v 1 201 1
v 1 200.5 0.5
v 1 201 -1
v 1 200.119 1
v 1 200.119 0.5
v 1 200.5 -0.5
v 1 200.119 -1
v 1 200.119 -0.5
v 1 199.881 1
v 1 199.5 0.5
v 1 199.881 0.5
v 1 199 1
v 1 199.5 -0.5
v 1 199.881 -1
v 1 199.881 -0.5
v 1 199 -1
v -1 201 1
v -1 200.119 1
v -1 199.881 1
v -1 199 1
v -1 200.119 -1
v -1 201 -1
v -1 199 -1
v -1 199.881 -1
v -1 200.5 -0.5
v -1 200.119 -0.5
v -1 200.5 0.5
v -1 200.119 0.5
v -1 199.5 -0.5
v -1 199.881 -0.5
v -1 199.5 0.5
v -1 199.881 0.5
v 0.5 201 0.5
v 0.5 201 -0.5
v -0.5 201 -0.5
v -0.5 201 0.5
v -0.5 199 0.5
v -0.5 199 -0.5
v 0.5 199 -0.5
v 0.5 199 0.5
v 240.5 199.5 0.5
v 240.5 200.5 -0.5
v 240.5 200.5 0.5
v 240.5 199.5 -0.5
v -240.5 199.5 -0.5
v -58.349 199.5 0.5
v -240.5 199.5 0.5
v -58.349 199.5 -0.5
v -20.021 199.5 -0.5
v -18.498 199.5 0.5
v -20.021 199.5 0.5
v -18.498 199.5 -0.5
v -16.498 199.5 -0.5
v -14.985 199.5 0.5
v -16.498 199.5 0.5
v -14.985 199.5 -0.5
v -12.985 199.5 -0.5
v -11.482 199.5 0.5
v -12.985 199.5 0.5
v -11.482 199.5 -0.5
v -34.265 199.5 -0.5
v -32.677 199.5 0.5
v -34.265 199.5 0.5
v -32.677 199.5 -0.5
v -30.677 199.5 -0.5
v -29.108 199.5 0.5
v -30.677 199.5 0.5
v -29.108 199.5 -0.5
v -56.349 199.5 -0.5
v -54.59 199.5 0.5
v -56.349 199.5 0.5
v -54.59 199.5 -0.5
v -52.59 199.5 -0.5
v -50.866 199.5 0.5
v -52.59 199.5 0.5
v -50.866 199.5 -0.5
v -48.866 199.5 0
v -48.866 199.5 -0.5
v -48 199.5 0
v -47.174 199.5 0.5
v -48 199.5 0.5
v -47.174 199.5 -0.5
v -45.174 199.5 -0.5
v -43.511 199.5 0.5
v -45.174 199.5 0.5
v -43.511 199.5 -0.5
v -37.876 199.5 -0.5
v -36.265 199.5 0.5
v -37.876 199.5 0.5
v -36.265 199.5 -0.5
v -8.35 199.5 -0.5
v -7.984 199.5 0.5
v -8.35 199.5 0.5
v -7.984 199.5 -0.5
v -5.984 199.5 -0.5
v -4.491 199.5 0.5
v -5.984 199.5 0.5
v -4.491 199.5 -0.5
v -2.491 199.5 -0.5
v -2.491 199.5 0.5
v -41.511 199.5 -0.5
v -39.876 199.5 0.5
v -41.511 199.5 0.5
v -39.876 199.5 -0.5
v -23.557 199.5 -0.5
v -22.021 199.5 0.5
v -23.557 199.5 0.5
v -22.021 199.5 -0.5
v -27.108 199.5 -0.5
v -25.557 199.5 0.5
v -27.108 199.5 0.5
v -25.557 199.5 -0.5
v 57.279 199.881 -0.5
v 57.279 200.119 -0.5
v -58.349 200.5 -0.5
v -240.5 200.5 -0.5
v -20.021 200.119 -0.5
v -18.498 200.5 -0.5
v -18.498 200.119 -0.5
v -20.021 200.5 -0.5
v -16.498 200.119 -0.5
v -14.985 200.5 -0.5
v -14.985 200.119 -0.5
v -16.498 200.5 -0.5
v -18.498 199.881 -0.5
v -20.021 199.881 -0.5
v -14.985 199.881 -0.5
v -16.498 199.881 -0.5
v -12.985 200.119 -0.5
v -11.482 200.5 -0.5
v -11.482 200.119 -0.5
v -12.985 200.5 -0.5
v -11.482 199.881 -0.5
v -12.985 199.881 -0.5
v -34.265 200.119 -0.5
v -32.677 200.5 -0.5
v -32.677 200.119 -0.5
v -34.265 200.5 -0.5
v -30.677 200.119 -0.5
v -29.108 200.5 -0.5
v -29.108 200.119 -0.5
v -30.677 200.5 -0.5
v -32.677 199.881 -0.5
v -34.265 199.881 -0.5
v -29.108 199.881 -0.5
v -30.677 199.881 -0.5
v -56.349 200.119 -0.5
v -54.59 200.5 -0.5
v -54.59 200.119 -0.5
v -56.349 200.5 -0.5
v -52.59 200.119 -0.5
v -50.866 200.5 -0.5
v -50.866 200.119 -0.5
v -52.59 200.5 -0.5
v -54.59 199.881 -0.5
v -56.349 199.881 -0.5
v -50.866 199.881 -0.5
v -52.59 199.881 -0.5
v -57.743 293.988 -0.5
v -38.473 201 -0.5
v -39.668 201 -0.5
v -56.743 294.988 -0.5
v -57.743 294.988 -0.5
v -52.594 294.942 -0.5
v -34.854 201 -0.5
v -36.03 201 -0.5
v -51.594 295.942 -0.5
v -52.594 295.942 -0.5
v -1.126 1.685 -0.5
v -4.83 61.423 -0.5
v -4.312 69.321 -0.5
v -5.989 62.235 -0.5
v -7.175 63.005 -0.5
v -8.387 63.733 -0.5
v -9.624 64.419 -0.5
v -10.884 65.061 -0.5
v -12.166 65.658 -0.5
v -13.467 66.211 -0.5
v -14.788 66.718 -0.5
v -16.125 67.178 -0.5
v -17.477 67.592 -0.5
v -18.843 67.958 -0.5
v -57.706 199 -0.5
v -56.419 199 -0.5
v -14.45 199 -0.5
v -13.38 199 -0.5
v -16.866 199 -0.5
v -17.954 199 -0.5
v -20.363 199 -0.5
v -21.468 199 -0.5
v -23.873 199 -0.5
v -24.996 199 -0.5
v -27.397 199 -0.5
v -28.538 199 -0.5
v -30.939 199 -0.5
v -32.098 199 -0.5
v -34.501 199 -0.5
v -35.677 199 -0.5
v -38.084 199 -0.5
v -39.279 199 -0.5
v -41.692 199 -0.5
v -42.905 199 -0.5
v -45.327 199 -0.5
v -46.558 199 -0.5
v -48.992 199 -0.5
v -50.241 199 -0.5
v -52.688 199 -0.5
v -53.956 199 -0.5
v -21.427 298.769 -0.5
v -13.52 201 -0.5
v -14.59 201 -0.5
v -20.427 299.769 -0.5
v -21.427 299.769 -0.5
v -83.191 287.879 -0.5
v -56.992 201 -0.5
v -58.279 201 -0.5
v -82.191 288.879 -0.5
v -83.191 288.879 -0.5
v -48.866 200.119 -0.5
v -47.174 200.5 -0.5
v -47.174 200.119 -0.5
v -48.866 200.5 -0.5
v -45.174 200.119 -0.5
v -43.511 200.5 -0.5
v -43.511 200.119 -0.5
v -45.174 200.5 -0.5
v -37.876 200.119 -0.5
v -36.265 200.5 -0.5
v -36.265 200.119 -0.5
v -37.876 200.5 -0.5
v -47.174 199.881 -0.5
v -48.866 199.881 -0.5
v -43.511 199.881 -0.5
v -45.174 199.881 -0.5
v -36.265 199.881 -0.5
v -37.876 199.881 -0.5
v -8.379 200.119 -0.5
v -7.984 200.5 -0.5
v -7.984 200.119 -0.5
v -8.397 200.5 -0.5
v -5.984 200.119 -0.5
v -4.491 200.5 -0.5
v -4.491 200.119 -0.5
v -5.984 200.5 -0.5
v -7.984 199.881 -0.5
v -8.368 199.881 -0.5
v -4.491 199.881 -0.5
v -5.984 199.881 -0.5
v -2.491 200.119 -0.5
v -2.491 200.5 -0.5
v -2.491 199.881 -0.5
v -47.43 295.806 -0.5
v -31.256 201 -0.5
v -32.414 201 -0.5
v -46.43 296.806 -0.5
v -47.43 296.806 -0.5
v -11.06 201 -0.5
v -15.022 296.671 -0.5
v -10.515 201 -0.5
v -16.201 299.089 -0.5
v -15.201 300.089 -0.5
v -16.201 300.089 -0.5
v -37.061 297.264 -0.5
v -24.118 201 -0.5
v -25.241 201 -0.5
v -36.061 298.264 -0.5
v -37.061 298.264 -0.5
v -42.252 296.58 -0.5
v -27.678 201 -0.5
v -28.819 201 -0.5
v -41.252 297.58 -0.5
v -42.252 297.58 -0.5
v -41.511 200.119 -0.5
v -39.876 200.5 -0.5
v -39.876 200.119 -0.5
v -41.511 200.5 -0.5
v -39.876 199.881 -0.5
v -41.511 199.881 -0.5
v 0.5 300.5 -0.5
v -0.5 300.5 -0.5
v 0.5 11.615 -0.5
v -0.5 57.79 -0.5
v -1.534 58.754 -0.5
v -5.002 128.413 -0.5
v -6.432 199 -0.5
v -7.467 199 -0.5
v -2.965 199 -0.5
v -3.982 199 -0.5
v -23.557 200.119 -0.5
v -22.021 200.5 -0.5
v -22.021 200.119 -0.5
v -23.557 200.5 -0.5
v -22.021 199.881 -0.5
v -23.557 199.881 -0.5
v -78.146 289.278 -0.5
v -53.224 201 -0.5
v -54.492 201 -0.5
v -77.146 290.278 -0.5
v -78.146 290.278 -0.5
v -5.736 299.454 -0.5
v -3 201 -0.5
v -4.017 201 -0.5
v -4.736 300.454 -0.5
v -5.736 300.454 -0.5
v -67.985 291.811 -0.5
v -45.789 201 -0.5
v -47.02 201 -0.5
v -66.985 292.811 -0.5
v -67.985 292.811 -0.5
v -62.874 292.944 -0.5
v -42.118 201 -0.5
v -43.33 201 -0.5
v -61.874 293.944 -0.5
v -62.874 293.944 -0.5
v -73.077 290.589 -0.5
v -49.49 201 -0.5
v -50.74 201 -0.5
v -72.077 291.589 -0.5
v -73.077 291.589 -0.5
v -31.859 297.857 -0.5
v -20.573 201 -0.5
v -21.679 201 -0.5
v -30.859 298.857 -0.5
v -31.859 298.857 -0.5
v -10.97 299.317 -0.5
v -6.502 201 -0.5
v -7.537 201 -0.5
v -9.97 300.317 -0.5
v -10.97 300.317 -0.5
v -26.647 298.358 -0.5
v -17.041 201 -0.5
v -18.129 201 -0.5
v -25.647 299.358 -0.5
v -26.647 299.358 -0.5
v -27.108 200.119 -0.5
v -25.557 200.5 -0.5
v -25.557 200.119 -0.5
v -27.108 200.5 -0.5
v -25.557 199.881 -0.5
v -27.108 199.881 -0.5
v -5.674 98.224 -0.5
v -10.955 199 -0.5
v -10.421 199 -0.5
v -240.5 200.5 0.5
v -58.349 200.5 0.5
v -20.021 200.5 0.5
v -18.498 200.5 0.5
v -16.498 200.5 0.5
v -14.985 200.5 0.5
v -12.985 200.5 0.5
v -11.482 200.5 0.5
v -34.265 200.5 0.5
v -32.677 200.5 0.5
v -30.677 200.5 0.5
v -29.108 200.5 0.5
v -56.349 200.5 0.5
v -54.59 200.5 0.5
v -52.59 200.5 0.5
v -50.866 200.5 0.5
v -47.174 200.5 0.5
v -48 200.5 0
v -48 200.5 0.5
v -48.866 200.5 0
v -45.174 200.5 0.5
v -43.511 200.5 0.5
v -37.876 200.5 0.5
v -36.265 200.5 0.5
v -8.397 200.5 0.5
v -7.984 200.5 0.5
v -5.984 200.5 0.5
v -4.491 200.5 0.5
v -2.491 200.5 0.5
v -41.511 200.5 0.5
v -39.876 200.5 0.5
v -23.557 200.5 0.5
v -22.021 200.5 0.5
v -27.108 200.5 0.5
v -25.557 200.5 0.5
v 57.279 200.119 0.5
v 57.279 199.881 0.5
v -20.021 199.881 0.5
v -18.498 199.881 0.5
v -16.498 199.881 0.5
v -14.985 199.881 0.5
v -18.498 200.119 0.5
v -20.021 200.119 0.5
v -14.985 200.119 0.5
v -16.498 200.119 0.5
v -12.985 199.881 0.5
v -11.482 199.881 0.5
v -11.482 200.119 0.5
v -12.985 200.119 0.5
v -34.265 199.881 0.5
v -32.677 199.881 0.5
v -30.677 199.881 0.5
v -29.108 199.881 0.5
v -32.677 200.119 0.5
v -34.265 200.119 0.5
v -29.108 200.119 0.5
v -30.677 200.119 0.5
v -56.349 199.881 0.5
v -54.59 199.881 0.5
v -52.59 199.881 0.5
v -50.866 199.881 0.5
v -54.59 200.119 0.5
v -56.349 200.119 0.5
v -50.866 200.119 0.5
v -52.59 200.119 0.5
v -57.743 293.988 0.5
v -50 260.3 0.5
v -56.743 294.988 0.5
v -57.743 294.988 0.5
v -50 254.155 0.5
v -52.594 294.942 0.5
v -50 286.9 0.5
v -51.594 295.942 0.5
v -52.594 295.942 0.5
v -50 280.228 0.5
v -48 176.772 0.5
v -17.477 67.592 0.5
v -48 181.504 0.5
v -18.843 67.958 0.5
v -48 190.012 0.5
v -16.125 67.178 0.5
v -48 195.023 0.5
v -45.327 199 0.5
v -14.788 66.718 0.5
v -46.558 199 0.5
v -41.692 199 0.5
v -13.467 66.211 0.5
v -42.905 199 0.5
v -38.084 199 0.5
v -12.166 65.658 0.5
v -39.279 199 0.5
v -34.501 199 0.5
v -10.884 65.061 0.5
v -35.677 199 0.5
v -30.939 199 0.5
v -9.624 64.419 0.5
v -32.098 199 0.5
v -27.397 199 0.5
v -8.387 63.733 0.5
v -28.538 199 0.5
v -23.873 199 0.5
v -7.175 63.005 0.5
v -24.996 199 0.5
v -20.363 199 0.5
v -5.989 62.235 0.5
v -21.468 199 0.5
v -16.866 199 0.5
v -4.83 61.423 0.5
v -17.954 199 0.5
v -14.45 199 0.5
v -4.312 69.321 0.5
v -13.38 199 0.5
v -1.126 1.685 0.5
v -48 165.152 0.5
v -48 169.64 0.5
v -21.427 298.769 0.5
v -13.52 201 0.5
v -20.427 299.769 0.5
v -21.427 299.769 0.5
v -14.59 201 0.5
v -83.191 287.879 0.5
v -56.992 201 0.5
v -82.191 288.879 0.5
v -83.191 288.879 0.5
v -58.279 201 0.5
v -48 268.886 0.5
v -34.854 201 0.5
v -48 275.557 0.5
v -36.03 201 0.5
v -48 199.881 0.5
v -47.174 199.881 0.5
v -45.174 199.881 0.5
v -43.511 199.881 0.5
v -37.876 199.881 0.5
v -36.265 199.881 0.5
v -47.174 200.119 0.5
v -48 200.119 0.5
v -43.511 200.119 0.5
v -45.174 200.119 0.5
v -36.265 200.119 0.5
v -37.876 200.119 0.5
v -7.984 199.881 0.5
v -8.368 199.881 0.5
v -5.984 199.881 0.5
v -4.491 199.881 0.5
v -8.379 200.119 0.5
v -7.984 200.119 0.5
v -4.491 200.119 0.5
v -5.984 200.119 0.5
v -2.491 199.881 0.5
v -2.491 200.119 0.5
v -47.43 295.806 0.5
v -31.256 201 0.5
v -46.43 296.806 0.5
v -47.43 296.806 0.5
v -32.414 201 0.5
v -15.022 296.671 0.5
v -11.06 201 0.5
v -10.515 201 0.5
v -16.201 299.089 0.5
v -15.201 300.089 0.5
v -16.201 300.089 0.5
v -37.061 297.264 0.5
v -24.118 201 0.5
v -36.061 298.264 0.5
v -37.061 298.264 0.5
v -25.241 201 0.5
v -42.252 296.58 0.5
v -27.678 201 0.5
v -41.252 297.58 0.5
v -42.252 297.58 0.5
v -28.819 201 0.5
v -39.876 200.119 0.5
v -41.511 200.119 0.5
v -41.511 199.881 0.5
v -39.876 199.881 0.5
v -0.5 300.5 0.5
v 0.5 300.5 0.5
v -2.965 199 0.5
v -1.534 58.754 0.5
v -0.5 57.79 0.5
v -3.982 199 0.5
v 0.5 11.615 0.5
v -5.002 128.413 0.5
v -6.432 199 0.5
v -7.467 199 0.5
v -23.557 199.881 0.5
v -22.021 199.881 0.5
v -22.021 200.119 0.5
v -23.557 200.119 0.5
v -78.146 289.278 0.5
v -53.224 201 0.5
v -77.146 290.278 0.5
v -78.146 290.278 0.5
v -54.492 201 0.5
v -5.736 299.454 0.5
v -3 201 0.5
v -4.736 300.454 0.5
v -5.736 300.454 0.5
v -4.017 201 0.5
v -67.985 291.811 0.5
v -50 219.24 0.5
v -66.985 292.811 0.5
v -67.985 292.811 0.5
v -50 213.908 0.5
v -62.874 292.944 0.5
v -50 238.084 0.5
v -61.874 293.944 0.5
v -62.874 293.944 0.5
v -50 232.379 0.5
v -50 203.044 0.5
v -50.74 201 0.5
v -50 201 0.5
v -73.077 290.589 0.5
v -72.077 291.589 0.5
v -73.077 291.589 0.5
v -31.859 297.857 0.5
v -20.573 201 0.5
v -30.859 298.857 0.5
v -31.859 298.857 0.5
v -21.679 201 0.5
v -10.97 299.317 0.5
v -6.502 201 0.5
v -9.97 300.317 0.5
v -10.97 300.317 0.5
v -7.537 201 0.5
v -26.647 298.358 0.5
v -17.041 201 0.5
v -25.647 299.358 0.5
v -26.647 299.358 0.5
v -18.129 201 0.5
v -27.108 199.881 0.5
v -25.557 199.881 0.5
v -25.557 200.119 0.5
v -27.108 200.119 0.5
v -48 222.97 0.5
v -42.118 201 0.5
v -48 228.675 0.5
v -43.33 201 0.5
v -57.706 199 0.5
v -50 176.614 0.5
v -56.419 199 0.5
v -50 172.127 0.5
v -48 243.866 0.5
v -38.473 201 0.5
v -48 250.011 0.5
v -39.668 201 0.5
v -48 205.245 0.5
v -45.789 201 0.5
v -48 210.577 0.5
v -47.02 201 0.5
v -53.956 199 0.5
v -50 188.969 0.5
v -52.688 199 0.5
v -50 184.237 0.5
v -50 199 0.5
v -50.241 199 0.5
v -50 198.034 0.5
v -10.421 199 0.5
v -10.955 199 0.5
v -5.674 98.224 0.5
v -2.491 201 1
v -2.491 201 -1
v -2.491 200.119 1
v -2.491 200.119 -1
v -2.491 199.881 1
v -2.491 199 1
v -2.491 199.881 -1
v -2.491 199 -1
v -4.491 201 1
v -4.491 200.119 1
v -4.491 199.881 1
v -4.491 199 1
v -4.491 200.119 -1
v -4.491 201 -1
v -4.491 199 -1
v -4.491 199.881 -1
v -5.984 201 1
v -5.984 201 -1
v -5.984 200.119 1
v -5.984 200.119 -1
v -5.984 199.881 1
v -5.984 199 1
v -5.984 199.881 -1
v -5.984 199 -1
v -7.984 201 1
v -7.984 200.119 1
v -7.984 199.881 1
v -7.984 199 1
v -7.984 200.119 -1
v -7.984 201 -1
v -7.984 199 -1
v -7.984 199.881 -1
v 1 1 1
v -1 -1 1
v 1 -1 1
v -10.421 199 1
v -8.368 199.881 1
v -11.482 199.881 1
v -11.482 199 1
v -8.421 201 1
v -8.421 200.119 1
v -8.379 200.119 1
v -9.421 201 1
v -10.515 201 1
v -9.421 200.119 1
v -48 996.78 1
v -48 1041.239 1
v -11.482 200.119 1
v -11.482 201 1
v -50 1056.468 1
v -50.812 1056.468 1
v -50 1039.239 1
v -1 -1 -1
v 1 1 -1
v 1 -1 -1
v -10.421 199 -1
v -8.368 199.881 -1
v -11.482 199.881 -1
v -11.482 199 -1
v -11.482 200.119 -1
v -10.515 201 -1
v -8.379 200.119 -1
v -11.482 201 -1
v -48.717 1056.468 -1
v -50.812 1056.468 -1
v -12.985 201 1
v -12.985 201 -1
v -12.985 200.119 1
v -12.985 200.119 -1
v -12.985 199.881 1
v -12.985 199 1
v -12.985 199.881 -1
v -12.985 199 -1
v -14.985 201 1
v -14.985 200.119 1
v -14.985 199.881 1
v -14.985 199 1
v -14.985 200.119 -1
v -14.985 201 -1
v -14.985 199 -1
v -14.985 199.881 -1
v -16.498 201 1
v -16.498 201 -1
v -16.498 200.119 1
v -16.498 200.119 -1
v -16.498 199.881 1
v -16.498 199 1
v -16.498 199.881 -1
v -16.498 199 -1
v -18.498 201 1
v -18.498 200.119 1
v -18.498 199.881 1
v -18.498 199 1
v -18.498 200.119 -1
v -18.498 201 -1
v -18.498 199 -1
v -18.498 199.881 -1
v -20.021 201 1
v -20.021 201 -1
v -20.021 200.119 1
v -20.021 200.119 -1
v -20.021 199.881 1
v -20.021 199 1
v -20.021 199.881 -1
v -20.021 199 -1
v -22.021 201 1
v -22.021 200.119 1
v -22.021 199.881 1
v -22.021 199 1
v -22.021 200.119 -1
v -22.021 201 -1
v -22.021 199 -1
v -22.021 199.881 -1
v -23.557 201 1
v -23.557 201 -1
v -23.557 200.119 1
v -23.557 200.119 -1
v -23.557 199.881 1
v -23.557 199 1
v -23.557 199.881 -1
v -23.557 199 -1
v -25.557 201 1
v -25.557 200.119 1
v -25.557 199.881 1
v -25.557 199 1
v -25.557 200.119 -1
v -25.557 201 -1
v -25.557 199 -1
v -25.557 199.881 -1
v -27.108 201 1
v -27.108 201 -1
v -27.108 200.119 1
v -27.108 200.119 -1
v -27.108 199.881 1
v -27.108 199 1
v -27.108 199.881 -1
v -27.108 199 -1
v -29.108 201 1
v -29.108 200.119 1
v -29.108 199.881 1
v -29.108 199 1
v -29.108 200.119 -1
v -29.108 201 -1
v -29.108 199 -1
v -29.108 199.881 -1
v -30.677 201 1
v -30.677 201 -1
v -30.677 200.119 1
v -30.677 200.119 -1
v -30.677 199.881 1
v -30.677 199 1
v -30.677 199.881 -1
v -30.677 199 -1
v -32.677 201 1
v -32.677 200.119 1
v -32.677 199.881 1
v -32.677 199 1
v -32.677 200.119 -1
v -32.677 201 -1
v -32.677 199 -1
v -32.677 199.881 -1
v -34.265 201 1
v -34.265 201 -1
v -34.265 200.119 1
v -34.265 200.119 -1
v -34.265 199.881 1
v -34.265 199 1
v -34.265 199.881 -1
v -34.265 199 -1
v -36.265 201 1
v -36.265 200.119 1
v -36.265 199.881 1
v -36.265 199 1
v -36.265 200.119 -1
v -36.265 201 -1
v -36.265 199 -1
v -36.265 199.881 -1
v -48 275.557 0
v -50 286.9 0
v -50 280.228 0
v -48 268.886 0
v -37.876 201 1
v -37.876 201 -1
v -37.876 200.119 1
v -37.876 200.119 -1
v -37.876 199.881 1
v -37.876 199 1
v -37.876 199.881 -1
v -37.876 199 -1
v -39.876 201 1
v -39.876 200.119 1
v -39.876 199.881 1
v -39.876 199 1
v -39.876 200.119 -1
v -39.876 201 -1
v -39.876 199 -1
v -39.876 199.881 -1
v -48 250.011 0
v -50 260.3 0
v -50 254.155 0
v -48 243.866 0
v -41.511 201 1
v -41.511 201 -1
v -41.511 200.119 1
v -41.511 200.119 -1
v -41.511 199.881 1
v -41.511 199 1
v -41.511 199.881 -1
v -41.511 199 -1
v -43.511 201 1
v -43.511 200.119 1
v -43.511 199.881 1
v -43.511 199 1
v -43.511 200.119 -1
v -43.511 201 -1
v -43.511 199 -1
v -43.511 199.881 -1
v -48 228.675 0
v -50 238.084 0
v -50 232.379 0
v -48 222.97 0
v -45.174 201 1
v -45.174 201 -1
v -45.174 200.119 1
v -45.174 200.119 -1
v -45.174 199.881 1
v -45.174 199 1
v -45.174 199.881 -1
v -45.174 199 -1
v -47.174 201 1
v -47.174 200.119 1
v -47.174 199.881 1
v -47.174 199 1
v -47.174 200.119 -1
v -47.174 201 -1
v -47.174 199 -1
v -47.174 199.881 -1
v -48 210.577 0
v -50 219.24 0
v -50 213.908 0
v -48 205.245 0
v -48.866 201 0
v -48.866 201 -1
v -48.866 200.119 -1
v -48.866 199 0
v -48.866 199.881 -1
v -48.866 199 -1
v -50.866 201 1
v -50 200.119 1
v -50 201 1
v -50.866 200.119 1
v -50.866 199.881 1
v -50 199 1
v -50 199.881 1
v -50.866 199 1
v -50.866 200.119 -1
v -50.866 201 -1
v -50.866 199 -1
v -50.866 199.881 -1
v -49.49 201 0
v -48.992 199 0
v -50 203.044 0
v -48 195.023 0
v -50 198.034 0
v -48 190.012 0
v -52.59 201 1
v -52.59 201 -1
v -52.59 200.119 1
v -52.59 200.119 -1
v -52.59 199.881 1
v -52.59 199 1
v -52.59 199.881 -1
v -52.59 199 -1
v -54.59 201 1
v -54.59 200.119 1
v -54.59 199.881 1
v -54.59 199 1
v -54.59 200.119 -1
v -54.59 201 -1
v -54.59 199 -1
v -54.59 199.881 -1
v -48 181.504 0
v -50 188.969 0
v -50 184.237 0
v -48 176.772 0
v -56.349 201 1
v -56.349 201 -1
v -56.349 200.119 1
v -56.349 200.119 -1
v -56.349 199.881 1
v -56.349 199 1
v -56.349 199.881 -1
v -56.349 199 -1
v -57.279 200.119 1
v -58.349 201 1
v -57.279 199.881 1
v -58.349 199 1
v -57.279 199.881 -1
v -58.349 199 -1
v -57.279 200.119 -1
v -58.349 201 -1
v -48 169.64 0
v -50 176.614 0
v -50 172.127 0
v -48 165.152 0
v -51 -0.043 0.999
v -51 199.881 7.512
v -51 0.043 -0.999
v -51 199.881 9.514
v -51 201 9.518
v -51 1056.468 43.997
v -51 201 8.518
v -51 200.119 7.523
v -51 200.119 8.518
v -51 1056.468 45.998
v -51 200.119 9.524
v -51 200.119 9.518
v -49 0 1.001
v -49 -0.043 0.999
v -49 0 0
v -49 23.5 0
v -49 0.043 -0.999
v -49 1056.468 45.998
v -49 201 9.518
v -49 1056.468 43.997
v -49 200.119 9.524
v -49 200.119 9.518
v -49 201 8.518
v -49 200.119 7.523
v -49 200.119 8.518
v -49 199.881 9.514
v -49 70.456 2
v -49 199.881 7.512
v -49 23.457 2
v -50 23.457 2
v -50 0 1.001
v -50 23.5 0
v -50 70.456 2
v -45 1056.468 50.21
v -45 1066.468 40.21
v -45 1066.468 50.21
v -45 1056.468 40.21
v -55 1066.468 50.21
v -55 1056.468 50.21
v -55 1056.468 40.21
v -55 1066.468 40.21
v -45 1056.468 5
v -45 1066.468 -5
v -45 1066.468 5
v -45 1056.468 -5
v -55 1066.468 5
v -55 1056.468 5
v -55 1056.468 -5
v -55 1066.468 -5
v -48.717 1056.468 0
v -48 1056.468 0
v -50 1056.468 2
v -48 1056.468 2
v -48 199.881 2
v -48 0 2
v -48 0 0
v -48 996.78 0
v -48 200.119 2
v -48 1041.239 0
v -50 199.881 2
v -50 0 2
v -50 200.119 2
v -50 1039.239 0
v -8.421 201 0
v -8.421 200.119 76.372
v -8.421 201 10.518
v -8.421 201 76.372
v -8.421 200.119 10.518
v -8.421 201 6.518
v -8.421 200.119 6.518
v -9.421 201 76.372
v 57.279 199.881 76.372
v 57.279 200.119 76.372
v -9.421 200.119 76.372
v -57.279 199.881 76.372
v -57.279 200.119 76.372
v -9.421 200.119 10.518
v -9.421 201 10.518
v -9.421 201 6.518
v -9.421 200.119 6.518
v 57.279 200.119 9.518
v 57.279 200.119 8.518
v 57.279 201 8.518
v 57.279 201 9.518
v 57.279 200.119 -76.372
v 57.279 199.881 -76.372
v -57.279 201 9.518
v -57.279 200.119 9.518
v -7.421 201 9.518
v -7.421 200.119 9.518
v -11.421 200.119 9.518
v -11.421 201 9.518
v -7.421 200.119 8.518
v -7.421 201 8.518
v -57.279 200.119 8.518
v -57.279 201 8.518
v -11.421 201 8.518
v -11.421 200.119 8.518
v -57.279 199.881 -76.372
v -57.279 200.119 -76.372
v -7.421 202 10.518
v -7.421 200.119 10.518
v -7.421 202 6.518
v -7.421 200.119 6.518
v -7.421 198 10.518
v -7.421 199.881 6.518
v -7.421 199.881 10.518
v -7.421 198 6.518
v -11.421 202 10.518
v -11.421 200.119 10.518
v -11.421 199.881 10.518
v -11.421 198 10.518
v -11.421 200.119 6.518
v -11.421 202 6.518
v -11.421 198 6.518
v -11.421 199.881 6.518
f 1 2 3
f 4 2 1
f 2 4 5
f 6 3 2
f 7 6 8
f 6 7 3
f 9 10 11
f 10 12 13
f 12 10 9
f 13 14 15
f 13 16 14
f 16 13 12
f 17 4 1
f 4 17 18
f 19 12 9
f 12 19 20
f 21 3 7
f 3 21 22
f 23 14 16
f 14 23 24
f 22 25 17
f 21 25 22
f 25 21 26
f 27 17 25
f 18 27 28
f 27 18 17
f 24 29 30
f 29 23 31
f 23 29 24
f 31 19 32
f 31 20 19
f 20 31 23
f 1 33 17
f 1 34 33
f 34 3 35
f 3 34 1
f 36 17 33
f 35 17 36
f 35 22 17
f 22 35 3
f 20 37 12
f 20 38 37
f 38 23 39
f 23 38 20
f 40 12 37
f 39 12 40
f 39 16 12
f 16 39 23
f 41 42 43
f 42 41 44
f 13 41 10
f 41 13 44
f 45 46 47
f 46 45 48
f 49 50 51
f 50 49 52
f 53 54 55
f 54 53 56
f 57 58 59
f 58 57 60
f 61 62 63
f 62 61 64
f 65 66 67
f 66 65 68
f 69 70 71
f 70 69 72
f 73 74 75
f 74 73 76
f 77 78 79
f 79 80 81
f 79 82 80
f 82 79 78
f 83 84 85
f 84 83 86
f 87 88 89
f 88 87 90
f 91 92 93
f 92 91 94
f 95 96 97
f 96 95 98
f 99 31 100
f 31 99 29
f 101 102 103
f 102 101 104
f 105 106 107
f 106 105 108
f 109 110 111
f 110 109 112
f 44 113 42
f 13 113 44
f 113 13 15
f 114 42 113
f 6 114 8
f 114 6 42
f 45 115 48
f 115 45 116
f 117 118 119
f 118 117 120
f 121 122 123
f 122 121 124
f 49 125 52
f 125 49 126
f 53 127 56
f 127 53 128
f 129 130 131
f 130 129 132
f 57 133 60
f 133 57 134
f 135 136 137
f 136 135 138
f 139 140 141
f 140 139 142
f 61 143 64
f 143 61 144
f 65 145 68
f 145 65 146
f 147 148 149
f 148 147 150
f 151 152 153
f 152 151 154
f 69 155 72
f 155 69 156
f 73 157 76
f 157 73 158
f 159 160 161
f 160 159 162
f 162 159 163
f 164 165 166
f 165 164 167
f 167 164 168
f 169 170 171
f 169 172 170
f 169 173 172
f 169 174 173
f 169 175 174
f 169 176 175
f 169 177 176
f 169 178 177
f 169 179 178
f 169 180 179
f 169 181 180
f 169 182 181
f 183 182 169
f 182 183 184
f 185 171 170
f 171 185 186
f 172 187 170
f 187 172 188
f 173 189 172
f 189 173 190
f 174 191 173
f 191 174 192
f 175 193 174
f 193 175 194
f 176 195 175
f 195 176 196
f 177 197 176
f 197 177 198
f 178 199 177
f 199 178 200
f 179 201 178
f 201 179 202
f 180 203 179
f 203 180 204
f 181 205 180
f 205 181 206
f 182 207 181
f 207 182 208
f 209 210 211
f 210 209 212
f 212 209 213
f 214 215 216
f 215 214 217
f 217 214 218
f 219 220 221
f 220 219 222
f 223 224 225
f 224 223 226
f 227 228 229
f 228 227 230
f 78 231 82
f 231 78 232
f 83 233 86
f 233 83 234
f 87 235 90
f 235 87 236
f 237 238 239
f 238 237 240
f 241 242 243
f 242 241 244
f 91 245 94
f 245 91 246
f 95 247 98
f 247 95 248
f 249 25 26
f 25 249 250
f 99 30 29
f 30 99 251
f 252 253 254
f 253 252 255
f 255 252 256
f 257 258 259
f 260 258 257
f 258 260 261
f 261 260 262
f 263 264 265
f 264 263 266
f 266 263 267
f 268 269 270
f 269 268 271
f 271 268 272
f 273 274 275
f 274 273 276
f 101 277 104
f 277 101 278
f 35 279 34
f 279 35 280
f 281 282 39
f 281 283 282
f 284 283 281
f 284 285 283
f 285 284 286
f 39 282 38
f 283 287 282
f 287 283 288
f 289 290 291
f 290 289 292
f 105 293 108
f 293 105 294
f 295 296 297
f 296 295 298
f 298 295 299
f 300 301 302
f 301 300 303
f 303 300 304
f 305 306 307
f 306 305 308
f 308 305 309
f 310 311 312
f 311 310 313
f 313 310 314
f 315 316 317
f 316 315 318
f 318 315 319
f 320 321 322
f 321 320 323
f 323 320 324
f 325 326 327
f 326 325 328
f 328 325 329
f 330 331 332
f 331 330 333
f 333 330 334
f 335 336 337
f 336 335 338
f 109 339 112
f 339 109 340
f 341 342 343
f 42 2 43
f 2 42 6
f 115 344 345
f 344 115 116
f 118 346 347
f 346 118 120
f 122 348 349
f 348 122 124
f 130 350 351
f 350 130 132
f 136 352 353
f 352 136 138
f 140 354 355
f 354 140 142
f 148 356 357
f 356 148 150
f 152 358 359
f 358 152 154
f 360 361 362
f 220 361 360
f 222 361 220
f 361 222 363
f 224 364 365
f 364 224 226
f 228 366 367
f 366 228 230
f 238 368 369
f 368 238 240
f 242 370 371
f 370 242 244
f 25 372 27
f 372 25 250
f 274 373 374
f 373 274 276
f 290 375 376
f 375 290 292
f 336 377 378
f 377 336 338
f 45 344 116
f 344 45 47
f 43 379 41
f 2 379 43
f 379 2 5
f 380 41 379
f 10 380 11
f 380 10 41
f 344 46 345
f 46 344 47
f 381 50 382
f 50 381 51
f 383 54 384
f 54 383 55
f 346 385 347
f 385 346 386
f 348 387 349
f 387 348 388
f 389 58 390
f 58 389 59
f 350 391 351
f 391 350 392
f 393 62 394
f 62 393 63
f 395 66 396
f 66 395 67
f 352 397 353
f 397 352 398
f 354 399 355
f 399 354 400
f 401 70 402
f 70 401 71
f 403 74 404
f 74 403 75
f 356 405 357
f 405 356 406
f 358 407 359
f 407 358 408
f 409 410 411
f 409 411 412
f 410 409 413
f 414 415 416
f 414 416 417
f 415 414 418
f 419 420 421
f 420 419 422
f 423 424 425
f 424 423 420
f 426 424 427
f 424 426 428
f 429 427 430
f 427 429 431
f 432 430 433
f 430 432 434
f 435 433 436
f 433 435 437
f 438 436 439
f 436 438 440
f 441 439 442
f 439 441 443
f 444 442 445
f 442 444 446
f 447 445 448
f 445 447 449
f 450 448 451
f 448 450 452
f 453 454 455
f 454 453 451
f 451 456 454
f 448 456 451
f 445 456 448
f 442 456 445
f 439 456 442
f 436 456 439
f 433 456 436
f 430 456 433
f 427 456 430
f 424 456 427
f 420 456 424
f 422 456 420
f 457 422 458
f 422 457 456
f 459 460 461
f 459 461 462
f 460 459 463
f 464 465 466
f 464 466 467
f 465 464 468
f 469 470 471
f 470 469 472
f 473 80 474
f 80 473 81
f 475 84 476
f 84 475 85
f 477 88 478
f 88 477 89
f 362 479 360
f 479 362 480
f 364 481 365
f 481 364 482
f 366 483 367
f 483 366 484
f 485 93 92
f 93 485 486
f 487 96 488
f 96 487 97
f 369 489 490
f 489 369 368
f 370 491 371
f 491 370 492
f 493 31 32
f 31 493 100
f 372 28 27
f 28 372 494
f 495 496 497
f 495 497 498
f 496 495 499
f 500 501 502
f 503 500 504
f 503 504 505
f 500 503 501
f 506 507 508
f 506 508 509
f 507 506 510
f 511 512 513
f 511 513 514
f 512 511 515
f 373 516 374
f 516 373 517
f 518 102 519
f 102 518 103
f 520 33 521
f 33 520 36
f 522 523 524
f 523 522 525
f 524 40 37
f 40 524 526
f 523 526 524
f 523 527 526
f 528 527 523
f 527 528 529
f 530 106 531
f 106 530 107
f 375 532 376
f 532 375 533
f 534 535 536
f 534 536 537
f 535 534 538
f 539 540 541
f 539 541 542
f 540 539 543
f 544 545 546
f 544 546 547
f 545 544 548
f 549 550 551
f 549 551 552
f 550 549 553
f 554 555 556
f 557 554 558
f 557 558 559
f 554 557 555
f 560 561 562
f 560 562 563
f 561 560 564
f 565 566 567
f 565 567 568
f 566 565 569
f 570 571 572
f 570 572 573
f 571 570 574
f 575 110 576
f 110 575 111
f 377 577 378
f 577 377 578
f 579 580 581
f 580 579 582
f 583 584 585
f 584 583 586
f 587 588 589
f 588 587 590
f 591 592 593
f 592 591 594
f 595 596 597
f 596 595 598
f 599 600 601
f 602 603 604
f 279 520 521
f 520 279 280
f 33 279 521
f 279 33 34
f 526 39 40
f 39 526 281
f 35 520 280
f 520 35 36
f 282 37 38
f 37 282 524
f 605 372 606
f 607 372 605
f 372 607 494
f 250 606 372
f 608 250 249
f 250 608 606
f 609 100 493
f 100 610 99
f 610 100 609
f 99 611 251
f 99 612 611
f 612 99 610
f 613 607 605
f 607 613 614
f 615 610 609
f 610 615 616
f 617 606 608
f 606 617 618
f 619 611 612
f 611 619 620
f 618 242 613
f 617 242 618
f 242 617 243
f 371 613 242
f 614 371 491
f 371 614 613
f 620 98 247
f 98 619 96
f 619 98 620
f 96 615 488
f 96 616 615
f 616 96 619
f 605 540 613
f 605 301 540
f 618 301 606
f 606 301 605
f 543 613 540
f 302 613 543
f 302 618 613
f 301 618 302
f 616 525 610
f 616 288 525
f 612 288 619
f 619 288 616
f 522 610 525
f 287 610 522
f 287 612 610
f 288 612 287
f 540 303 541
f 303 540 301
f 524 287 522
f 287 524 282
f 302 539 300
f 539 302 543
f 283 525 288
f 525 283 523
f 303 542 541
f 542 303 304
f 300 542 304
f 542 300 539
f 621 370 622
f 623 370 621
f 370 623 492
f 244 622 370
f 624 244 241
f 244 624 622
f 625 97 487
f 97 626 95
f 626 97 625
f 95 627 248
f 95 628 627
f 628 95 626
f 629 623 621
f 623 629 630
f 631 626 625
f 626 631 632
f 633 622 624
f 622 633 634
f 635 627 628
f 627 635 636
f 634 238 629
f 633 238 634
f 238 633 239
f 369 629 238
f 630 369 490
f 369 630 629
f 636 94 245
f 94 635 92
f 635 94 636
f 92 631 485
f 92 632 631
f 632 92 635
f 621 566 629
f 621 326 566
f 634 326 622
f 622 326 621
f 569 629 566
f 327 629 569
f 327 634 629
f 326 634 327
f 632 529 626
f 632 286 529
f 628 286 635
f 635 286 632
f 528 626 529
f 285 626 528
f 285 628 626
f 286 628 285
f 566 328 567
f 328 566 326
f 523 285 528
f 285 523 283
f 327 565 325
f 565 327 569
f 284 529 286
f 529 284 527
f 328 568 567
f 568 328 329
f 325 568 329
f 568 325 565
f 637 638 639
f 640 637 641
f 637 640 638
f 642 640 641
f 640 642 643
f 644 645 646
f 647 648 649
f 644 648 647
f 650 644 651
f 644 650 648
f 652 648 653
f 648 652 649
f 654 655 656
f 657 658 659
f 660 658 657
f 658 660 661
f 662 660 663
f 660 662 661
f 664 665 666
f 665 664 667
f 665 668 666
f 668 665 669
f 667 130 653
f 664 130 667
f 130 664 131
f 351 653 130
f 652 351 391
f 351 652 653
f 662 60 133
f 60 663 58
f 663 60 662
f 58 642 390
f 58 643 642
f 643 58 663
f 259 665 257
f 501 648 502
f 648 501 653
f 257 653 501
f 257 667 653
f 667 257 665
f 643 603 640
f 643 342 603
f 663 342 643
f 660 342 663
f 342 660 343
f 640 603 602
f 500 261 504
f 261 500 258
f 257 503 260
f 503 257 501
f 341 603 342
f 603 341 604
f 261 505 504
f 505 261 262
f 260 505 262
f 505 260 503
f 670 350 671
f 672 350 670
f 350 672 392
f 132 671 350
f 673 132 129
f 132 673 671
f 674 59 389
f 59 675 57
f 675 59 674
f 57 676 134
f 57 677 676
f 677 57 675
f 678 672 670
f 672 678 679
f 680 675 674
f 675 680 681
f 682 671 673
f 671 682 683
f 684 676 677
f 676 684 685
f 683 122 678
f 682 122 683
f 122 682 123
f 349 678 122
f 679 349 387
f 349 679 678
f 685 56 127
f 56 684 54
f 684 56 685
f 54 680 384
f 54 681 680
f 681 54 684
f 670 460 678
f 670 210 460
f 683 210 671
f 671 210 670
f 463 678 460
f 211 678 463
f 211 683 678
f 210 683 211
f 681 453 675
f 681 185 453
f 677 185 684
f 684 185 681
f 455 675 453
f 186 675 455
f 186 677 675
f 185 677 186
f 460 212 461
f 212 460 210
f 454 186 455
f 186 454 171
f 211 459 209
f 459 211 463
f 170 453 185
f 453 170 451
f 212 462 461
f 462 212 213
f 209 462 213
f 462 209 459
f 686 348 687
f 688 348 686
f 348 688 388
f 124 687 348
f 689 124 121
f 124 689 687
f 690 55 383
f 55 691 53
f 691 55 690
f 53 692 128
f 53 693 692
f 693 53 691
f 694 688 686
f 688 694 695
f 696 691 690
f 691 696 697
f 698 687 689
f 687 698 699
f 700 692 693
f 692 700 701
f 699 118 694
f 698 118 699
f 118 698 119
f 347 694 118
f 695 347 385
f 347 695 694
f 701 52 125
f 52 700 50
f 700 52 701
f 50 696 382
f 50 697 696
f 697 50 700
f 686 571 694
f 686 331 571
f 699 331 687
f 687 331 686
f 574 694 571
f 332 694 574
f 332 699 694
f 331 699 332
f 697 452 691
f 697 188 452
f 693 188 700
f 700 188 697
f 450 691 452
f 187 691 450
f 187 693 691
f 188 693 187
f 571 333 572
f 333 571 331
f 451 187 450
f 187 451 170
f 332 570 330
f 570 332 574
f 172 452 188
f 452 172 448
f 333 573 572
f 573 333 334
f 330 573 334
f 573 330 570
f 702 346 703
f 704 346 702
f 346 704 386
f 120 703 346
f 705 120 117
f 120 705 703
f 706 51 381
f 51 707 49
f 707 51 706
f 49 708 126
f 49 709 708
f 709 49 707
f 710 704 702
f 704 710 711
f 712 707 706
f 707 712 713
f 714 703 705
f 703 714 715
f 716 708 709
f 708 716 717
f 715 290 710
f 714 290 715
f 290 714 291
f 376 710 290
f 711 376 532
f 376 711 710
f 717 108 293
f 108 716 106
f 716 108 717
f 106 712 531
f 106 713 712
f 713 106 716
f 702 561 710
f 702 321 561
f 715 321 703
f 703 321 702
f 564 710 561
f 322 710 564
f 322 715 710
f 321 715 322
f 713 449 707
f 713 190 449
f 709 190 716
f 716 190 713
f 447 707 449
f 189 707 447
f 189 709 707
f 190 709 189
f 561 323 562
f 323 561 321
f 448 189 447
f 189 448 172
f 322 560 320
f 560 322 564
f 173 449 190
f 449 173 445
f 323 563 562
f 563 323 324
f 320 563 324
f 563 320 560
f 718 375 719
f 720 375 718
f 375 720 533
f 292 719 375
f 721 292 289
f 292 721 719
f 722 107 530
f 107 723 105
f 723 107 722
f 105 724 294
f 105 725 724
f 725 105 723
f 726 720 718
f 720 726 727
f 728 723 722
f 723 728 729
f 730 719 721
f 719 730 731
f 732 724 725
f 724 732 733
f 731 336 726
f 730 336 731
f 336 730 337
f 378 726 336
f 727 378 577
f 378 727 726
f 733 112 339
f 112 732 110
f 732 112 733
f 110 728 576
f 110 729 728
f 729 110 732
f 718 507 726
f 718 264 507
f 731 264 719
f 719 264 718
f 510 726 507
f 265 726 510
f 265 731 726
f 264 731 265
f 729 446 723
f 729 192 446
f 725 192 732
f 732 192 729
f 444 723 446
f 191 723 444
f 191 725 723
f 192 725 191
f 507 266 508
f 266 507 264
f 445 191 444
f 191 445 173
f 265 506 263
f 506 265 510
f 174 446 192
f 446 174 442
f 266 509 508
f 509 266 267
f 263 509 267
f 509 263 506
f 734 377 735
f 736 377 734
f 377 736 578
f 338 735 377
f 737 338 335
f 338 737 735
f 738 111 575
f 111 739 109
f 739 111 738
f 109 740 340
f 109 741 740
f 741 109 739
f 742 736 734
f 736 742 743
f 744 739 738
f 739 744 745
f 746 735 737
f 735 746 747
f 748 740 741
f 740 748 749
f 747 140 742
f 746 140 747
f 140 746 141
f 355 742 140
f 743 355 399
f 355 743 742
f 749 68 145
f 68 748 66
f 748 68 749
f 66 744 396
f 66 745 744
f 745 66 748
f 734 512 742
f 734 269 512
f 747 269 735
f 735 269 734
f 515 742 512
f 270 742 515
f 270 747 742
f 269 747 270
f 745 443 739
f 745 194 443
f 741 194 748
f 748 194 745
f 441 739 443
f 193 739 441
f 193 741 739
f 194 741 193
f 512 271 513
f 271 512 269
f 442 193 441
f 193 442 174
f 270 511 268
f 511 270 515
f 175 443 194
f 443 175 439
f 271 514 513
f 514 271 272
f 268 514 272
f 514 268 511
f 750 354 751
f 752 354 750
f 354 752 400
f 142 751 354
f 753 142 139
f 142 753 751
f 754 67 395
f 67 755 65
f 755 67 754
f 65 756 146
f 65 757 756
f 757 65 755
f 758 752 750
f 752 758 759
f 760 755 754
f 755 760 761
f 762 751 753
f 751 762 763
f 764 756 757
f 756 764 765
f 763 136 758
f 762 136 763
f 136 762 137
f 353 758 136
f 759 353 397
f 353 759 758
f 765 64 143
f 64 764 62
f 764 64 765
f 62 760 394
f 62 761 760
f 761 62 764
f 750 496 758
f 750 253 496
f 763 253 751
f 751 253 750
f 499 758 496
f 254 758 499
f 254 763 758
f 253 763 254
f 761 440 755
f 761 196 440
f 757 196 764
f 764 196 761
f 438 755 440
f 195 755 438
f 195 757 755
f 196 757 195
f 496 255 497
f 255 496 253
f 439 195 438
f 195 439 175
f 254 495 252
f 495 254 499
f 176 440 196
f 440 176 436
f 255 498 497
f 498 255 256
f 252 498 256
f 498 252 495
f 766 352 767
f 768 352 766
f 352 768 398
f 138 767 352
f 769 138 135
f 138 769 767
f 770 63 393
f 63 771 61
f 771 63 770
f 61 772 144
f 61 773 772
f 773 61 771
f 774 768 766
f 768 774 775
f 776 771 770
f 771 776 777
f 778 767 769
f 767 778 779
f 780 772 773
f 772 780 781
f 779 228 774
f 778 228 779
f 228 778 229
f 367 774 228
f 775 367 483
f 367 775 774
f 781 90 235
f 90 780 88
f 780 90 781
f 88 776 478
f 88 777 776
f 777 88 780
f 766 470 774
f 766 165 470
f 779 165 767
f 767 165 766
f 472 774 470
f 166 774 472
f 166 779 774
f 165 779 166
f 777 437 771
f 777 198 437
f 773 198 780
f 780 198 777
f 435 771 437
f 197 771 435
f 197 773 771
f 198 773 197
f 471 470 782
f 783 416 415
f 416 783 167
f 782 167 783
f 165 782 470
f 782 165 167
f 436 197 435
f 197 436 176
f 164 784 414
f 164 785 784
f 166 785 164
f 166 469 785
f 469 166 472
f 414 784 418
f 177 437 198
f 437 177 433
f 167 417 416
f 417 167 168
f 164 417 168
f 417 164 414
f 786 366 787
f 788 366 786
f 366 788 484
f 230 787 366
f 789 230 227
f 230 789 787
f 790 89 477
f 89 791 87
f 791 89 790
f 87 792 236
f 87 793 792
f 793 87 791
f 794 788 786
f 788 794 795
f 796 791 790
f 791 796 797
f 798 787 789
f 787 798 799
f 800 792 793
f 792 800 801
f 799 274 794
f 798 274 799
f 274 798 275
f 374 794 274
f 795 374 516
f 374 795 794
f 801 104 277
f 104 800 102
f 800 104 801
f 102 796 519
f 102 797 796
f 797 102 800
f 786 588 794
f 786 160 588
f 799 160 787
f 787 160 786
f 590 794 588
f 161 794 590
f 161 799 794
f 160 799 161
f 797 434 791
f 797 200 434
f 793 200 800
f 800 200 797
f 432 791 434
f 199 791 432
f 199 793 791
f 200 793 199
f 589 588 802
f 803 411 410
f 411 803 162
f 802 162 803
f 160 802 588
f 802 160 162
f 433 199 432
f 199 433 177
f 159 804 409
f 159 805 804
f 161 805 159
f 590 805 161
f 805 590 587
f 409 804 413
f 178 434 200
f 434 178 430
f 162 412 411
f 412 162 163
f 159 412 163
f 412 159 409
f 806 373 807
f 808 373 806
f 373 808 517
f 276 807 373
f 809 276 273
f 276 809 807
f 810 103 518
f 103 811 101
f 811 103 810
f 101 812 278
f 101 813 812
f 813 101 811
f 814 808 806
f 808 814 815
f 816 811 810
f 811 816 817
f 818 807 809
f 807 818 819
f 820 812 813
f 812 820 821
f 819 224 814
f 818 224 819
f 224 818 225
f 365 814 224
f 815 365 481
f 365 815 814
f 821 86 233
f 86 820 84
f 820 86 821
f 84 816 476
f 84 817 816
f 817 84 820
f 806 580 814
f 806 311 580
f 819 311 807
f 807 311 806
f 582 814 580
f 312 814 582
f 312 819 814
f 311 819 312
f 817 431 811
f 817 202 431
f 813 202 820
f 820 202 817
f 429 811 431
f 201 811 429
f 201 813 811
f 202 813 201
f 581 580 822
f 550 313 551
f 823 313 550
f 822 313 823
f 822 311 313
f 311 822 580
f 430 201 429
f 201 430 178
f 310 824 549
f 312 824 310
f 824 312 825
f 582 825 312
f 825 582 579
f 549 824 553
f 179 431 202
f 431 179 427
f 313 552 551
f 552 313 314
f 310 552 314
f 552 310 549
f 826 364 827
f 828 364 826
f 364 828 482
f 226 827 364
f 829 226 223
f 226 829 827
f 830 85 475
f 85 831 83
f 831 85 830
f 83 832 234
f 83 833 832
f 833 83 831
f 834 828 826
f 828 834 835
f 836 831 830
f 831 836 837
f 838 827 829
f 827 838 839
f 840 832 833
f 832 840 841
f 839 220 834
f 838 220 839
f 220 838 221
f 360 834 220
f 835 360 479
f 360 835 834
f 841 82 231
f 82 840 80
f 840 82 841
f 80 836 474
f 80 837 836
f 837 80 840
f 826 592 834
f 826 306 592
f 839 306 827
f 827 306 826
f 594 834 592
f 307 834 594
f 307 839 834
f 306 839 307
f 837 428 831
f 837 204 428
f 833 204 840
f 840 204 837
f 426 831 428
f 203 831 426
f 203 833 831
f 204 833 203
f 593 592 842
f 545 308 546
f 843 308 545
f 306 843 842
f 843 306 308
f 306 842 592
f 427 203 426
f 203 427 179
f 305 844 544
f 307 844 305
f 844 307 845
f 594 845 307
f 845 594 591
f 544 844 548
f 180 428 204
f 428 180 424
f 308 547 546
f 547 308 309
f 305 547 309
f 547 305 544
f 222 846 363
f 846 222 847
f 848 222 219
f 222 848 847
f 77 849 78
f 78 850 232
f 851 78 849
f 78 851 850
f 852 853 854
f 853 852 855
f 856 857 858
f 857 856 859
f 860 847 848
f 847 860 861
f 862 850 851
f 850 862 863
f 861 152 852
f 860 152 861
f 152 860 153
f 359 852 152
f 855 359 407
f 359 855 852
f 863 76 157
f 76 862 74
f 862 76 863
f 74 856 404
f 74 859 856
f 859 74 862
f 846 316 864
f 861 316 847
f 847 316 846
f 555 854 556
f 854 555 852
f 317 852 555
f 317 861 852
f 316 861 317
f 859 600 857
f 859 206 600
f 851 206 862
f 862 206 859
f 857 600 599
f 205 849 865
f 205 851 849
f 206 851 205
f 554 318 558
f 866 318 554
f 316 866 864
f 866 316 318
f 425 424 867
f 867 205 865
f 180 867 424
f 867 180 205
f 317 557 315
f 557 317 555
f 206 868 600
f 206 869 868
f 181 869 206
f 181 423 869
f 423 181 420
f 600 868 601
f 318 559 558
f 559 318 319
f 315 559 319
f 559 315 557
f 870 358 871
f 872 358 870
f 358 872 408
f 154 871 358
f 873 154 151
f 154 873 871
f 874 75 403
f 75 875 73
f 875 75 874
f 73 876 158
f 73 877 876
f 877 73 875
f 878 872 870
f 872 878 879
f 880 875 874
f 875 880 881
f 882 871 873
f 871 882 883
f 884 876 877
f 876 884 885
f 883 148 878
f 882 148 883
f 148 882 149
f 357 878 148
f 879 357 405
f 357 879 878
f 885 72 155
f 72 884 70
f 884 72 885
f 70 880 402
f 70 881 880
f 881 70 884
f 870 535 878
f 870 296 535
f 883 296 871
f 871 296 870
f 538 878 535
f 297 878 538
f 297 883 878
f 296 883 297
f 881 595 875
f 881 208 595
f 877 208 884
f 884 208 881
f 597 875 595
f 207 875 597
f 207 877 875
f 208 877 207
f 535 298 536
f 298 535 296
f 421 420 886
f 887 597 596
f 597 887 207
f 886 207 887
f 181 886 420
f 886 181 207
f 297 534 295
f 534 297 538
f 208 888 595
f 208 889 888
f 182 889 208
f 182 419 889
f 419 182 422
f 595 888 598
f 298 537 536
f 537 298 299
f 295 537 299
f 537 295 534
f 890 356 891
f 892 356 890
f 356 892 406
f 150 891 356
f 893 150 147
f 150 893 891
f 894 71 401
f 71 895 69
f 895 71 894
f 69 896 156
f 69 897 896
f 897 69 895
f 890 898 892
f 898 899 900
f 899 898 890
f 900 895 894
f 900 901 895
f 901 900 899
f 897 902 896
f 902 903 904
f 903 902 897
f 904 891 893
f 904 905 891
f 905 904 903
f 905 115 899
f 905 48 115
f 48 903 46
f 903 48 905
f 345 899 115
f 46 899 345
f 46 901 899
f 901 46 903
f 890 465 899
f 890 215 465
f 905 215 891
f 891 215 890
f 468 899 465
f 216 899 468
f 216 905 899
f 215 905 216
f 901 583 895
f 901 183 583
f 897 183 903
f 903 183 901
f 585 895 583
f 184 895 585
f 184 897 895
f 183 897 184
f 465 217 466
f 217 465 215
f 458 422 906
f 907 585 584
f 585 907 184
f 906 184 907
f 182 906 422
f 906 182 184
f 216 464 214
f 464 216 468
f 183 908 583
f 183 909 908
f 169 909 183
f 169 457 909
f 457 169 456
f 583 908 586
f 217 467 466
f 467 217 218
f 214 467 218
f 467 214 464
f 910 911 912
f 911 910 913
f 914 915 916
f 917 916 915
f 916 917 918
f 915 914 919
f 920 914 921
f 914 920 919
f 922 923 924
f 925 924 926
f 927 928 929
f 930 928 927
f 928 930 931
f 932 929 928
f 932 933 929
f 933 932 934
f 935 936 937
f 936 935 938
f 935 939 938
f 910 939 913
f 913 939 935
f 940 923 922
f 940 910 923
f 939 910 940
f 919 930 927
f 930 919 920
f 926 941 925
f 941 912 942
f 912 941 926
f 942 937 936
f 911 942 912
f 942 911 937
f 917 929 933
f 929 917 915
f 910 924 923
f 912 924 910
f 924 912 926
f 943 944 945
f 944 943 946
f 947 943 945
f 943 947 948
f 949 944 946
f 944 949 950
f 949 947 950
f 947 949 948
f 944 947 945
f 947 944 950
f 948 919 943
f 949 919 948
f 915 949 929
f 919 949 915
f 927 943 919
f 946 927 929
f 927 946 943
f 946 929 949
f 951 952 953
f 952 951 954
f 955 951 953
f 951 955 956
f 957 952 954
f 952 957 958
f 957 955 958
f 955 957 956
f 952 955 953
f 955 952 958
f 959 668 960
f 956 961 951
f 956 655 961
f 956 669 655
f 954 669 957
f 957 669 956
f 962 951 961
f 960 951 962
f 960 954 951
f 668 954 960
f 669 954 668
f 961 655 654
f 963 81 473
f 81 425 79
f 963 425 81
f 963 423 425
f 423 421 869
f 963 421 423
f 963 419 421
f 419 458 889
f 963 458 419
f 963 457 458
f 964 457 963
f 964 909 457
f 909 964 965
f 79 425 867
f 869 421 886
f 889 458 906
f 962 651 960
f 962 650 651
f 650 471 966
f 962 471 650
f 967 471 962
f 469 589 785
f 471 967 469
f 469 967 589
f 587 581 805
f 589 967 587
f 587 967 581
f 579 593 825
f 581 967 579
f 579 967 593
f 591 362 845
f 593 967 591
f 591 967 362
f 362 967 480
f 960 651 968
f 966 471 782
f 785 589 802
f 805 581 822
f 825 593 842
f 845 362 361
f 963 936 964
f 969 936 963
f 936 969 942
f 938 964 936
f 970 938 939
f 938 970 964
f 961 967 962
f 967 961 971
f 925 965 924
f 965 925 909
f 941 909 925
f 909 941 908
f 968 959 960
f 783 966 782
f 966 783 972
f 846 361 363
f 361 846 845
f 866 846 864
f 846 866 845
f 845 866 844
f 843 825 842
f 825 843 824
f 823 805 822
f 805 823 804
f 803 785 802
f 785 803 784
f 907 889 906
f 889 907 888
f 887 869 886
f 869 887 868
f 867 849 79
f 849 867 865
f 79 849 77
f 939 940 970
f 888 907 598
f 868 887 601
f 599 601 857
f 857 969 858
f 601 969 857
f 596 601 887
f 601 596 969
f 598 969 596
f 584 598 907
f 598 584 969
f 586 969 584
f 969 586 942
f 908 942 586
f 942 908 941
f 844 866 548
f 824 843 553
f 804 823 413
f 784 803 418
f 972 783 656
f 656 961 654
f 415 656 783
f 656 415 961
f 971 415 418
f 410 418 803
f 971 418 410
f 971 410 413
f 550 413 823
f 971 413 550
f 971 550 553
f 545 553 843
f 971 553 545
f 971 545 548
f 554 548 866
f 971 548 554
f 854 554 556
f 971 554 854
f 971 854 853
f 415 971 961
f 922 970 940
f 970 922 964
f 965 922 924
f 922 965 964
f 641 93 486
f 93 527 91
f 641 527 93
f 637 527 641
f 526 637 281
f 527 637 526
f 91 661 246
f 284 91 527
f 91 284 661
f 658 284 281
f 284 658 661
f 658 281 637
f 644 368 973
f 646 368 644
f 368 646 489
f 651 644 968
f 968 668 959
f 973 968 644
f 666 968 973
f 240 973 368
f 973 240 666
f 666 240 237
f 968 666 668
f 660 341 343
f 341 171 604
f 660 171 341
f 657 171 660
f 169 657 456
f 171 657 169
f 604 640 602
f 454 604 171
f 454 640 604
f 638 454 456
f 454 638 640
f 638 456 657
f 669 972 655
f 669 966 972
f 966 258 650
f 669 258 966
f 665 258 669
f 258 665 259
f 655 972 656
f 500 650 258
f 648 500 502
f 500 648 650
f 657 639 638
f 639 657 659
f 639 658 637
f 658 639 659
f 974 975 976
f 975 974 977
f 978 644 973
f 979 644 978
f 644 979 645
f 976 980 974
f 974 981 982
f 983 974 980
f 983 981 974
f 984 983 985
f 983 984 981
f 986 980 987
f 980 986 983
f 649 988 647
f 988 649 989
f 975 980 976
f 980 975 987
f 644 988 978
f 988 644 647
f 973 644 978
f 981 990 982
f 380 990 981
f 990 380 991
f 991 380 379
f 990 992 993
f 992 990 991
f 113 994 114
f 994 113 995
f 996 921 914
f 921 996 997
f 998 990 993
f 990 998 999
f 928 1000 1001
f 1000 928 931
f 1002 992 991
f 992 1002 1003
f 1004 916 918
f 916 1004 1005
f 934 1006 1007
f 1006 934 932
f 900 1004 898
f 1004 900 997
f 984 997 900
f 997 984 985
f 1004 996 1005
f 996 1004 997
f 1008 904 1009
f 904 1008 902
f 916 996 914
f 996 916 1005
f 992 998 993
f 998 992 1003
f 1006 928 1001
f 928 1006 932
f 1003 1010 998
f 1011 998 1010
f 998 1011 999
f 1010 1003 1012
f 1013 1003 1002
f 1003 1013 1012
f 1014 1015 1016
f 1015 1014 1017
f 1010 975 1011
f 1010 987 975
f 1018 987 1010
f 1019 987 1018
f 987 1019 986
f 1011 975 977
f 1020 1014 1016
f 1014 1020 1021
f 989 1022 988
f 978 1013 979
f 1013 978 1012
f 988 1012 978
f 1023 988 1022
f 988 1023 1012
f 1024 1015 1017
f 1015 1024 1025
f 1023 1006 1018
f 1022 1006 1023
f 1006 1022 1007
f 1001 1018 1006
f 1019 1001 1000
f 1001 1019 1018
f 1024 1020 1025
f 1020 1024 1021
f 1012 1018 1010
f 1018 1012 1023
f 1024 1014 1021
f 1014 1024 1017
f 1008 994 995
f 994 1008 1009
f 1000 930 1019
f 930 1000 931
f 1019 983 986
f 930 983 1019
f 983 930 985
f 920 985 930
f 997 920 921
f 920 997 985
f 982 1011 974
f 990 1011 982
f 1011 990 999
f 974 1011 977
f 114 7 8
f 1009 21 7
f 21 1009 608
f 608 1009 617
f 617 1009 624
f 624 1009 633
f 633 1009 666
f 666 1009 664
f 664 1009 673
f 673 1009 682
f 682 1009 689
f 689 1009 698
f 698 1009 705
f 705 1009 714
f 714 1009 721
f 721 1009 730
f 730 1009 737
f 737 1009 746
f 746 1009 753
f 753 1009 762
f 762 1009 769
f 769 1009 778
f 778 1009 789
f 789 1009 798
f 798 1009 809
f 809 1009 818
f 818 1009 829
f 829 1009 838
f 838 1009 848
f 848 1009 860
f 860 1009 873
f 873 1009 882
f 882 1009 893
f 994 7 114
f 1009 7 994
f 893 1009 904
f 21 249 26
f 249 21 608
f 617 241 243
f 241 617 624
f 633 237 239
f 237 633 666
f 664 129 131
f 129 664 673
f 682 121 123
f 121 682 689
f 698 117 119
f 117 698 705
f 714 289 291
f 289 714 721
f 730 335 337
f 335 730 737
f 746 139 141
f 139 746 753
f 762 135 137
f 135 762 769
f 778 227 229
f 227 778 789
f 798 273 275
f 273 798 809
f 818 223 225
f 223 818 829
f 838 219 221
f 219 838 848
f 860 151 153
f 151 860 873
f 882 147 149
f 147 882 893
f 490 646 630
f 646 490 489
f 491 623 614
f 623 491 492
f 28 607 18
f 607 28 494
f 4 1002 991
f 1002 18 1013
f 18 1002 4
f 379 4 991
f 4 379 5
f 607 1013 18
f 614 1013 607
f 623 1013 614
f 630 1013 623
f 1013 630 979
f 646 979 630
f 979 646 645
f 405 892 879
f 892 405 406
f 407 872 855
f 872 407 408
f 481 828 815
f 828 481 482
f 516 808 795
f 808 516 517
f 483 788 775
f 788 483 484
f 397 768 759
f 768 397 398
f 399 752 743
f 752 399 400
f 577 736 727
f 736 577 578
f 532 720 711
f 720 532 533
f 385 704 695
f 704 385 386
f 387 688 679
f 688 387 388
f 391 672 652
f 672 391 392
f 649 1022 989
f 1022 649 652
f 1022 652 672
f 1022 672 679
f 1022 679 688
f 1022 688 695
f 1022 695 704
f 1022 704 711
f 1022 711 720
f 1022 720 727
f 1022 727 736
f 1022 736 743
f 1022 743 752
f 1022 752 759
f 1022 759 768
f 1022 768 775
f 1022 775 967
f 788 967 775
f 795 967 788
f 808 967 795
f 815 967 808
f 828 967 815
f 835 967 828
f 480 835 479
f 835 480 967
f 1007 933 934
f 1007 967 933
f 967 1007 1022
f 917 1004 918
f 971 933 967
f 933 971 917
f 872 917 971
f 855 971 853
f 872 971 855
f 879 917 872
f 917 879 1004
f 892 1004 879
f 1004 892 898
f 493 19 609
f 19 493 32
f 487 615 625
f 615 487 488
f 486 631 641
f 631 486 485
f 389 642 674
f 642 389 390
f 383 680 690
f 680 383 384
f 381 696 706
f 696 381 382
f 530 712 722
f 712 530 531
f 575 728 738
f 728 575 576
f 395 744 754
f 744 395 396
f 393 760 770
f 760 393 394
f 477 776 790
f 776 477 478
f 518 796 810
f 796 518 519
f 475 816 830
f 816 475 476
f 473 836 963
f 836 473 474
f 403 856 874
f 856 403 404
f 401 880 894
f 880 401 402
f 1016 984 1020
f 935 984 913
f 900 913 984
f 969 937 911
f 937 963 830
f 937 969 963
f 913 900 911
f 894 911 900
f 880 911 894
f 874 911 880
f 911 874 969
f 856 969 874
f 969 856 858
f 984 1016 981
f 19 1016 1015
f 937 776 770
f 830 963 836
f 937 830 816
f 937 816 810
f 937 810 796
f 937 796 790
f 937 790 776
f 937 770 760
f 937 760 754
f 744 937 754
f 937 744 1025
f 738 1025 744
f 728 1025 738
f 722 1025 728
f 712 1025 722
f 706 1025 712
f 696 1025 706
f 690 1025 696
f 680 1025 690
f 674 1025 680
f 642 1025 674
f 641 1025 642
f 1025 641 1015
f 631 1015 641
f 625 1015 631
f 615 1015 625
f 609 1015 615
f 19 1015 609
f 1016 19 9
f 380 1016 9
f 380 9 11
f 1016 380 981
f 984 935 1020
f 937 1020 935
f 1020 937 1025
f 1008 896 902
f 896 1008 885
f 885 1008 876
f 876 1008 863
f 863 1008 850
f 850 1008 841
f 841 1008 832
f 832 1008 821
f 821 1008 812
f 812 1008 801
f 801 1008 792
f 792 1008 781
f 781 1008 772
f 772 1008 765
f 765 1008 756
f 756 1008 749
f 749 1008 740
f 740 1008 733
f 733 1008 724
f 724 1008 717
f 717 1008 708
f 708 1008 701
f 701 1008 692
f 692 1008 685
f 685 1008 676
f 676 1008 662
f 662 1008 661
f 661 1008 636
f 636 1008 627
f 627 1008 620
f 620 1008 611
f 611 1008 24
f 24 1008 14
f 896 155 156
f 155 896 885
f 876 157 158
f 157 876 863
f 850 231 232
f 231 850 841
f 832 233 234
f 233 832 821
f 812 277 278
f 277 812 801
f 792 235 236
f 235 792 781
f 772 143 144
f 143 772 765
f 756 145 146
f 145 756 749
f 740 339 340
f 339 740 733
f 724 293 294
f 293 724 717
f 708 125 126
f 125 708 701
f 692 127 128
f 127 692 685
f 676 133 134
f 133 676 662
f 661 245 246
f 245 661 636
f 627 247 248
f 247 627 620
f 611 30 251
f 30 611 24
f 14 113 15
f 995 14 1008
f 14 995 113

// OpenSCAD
p1=[-240,200];
p2=[240,200];
p3=[0,0];

for (deg=[90:1:90+16]){
    x1=cos(deg)*300;
    y1=sin(deg)*300;

    p4=[x1,y1];

    m=p4[1]/p4[0];

    ix=200/m;
    i=[ix,200];

    color("red")translate(i)cube([2,2,2],true);

    hull(){
        translate(p1)cube(1,true);
        translate(p2)cube(1,true);
    }
    hull(){
        translate(p3)cube(1,true);
        translate(p4)cube(1,true);
    }

}

//Ray
l=rands(200,10000,1)[0];
deg=rands(-16,16,1)[0];

color("red")rotate([deg,0,0])translate([-50,l/2,0])cube([2,l,2],true);
zr=sin(deg)*l;
yr=cos(deg)*l;
rep = [-50,yr,zr]; //rayendpoint
color("blue")translate(rep)cube(10,true);
rpp = [-50,yr,0]; //rayprojpoint
rppdeg=atan2( rpp[1],rpp[0]);
color("orange")translate(rpp)cube(10,true);
color("green")translate([-50,0,0])cube([2,yr,2]);

color("blue")hull(){
    translate(p3)cube(2,true);
    translate(rpp)cube(2,true);
}

mrpp=rpp[1]/rpp[0];
ix2=200/mrpp;
ipp=[ix2,200];
color("pink")translate(ipp)cube([1,1,320/4.19]);

//da rifare
mzpp=yr/zr;

iz=200/mzpp; //200??
izpp=[-480/4.19/2 , 200, iz];
color("aqua")translate(izpp)cube([480/4.19,1,1]);

//result
color("blue")translate([ix2,200,iz])cube([4,4,4],true);

//image
color("white",0.2)translate([0,200,0])cube([480,1,640]/4.19,true);
